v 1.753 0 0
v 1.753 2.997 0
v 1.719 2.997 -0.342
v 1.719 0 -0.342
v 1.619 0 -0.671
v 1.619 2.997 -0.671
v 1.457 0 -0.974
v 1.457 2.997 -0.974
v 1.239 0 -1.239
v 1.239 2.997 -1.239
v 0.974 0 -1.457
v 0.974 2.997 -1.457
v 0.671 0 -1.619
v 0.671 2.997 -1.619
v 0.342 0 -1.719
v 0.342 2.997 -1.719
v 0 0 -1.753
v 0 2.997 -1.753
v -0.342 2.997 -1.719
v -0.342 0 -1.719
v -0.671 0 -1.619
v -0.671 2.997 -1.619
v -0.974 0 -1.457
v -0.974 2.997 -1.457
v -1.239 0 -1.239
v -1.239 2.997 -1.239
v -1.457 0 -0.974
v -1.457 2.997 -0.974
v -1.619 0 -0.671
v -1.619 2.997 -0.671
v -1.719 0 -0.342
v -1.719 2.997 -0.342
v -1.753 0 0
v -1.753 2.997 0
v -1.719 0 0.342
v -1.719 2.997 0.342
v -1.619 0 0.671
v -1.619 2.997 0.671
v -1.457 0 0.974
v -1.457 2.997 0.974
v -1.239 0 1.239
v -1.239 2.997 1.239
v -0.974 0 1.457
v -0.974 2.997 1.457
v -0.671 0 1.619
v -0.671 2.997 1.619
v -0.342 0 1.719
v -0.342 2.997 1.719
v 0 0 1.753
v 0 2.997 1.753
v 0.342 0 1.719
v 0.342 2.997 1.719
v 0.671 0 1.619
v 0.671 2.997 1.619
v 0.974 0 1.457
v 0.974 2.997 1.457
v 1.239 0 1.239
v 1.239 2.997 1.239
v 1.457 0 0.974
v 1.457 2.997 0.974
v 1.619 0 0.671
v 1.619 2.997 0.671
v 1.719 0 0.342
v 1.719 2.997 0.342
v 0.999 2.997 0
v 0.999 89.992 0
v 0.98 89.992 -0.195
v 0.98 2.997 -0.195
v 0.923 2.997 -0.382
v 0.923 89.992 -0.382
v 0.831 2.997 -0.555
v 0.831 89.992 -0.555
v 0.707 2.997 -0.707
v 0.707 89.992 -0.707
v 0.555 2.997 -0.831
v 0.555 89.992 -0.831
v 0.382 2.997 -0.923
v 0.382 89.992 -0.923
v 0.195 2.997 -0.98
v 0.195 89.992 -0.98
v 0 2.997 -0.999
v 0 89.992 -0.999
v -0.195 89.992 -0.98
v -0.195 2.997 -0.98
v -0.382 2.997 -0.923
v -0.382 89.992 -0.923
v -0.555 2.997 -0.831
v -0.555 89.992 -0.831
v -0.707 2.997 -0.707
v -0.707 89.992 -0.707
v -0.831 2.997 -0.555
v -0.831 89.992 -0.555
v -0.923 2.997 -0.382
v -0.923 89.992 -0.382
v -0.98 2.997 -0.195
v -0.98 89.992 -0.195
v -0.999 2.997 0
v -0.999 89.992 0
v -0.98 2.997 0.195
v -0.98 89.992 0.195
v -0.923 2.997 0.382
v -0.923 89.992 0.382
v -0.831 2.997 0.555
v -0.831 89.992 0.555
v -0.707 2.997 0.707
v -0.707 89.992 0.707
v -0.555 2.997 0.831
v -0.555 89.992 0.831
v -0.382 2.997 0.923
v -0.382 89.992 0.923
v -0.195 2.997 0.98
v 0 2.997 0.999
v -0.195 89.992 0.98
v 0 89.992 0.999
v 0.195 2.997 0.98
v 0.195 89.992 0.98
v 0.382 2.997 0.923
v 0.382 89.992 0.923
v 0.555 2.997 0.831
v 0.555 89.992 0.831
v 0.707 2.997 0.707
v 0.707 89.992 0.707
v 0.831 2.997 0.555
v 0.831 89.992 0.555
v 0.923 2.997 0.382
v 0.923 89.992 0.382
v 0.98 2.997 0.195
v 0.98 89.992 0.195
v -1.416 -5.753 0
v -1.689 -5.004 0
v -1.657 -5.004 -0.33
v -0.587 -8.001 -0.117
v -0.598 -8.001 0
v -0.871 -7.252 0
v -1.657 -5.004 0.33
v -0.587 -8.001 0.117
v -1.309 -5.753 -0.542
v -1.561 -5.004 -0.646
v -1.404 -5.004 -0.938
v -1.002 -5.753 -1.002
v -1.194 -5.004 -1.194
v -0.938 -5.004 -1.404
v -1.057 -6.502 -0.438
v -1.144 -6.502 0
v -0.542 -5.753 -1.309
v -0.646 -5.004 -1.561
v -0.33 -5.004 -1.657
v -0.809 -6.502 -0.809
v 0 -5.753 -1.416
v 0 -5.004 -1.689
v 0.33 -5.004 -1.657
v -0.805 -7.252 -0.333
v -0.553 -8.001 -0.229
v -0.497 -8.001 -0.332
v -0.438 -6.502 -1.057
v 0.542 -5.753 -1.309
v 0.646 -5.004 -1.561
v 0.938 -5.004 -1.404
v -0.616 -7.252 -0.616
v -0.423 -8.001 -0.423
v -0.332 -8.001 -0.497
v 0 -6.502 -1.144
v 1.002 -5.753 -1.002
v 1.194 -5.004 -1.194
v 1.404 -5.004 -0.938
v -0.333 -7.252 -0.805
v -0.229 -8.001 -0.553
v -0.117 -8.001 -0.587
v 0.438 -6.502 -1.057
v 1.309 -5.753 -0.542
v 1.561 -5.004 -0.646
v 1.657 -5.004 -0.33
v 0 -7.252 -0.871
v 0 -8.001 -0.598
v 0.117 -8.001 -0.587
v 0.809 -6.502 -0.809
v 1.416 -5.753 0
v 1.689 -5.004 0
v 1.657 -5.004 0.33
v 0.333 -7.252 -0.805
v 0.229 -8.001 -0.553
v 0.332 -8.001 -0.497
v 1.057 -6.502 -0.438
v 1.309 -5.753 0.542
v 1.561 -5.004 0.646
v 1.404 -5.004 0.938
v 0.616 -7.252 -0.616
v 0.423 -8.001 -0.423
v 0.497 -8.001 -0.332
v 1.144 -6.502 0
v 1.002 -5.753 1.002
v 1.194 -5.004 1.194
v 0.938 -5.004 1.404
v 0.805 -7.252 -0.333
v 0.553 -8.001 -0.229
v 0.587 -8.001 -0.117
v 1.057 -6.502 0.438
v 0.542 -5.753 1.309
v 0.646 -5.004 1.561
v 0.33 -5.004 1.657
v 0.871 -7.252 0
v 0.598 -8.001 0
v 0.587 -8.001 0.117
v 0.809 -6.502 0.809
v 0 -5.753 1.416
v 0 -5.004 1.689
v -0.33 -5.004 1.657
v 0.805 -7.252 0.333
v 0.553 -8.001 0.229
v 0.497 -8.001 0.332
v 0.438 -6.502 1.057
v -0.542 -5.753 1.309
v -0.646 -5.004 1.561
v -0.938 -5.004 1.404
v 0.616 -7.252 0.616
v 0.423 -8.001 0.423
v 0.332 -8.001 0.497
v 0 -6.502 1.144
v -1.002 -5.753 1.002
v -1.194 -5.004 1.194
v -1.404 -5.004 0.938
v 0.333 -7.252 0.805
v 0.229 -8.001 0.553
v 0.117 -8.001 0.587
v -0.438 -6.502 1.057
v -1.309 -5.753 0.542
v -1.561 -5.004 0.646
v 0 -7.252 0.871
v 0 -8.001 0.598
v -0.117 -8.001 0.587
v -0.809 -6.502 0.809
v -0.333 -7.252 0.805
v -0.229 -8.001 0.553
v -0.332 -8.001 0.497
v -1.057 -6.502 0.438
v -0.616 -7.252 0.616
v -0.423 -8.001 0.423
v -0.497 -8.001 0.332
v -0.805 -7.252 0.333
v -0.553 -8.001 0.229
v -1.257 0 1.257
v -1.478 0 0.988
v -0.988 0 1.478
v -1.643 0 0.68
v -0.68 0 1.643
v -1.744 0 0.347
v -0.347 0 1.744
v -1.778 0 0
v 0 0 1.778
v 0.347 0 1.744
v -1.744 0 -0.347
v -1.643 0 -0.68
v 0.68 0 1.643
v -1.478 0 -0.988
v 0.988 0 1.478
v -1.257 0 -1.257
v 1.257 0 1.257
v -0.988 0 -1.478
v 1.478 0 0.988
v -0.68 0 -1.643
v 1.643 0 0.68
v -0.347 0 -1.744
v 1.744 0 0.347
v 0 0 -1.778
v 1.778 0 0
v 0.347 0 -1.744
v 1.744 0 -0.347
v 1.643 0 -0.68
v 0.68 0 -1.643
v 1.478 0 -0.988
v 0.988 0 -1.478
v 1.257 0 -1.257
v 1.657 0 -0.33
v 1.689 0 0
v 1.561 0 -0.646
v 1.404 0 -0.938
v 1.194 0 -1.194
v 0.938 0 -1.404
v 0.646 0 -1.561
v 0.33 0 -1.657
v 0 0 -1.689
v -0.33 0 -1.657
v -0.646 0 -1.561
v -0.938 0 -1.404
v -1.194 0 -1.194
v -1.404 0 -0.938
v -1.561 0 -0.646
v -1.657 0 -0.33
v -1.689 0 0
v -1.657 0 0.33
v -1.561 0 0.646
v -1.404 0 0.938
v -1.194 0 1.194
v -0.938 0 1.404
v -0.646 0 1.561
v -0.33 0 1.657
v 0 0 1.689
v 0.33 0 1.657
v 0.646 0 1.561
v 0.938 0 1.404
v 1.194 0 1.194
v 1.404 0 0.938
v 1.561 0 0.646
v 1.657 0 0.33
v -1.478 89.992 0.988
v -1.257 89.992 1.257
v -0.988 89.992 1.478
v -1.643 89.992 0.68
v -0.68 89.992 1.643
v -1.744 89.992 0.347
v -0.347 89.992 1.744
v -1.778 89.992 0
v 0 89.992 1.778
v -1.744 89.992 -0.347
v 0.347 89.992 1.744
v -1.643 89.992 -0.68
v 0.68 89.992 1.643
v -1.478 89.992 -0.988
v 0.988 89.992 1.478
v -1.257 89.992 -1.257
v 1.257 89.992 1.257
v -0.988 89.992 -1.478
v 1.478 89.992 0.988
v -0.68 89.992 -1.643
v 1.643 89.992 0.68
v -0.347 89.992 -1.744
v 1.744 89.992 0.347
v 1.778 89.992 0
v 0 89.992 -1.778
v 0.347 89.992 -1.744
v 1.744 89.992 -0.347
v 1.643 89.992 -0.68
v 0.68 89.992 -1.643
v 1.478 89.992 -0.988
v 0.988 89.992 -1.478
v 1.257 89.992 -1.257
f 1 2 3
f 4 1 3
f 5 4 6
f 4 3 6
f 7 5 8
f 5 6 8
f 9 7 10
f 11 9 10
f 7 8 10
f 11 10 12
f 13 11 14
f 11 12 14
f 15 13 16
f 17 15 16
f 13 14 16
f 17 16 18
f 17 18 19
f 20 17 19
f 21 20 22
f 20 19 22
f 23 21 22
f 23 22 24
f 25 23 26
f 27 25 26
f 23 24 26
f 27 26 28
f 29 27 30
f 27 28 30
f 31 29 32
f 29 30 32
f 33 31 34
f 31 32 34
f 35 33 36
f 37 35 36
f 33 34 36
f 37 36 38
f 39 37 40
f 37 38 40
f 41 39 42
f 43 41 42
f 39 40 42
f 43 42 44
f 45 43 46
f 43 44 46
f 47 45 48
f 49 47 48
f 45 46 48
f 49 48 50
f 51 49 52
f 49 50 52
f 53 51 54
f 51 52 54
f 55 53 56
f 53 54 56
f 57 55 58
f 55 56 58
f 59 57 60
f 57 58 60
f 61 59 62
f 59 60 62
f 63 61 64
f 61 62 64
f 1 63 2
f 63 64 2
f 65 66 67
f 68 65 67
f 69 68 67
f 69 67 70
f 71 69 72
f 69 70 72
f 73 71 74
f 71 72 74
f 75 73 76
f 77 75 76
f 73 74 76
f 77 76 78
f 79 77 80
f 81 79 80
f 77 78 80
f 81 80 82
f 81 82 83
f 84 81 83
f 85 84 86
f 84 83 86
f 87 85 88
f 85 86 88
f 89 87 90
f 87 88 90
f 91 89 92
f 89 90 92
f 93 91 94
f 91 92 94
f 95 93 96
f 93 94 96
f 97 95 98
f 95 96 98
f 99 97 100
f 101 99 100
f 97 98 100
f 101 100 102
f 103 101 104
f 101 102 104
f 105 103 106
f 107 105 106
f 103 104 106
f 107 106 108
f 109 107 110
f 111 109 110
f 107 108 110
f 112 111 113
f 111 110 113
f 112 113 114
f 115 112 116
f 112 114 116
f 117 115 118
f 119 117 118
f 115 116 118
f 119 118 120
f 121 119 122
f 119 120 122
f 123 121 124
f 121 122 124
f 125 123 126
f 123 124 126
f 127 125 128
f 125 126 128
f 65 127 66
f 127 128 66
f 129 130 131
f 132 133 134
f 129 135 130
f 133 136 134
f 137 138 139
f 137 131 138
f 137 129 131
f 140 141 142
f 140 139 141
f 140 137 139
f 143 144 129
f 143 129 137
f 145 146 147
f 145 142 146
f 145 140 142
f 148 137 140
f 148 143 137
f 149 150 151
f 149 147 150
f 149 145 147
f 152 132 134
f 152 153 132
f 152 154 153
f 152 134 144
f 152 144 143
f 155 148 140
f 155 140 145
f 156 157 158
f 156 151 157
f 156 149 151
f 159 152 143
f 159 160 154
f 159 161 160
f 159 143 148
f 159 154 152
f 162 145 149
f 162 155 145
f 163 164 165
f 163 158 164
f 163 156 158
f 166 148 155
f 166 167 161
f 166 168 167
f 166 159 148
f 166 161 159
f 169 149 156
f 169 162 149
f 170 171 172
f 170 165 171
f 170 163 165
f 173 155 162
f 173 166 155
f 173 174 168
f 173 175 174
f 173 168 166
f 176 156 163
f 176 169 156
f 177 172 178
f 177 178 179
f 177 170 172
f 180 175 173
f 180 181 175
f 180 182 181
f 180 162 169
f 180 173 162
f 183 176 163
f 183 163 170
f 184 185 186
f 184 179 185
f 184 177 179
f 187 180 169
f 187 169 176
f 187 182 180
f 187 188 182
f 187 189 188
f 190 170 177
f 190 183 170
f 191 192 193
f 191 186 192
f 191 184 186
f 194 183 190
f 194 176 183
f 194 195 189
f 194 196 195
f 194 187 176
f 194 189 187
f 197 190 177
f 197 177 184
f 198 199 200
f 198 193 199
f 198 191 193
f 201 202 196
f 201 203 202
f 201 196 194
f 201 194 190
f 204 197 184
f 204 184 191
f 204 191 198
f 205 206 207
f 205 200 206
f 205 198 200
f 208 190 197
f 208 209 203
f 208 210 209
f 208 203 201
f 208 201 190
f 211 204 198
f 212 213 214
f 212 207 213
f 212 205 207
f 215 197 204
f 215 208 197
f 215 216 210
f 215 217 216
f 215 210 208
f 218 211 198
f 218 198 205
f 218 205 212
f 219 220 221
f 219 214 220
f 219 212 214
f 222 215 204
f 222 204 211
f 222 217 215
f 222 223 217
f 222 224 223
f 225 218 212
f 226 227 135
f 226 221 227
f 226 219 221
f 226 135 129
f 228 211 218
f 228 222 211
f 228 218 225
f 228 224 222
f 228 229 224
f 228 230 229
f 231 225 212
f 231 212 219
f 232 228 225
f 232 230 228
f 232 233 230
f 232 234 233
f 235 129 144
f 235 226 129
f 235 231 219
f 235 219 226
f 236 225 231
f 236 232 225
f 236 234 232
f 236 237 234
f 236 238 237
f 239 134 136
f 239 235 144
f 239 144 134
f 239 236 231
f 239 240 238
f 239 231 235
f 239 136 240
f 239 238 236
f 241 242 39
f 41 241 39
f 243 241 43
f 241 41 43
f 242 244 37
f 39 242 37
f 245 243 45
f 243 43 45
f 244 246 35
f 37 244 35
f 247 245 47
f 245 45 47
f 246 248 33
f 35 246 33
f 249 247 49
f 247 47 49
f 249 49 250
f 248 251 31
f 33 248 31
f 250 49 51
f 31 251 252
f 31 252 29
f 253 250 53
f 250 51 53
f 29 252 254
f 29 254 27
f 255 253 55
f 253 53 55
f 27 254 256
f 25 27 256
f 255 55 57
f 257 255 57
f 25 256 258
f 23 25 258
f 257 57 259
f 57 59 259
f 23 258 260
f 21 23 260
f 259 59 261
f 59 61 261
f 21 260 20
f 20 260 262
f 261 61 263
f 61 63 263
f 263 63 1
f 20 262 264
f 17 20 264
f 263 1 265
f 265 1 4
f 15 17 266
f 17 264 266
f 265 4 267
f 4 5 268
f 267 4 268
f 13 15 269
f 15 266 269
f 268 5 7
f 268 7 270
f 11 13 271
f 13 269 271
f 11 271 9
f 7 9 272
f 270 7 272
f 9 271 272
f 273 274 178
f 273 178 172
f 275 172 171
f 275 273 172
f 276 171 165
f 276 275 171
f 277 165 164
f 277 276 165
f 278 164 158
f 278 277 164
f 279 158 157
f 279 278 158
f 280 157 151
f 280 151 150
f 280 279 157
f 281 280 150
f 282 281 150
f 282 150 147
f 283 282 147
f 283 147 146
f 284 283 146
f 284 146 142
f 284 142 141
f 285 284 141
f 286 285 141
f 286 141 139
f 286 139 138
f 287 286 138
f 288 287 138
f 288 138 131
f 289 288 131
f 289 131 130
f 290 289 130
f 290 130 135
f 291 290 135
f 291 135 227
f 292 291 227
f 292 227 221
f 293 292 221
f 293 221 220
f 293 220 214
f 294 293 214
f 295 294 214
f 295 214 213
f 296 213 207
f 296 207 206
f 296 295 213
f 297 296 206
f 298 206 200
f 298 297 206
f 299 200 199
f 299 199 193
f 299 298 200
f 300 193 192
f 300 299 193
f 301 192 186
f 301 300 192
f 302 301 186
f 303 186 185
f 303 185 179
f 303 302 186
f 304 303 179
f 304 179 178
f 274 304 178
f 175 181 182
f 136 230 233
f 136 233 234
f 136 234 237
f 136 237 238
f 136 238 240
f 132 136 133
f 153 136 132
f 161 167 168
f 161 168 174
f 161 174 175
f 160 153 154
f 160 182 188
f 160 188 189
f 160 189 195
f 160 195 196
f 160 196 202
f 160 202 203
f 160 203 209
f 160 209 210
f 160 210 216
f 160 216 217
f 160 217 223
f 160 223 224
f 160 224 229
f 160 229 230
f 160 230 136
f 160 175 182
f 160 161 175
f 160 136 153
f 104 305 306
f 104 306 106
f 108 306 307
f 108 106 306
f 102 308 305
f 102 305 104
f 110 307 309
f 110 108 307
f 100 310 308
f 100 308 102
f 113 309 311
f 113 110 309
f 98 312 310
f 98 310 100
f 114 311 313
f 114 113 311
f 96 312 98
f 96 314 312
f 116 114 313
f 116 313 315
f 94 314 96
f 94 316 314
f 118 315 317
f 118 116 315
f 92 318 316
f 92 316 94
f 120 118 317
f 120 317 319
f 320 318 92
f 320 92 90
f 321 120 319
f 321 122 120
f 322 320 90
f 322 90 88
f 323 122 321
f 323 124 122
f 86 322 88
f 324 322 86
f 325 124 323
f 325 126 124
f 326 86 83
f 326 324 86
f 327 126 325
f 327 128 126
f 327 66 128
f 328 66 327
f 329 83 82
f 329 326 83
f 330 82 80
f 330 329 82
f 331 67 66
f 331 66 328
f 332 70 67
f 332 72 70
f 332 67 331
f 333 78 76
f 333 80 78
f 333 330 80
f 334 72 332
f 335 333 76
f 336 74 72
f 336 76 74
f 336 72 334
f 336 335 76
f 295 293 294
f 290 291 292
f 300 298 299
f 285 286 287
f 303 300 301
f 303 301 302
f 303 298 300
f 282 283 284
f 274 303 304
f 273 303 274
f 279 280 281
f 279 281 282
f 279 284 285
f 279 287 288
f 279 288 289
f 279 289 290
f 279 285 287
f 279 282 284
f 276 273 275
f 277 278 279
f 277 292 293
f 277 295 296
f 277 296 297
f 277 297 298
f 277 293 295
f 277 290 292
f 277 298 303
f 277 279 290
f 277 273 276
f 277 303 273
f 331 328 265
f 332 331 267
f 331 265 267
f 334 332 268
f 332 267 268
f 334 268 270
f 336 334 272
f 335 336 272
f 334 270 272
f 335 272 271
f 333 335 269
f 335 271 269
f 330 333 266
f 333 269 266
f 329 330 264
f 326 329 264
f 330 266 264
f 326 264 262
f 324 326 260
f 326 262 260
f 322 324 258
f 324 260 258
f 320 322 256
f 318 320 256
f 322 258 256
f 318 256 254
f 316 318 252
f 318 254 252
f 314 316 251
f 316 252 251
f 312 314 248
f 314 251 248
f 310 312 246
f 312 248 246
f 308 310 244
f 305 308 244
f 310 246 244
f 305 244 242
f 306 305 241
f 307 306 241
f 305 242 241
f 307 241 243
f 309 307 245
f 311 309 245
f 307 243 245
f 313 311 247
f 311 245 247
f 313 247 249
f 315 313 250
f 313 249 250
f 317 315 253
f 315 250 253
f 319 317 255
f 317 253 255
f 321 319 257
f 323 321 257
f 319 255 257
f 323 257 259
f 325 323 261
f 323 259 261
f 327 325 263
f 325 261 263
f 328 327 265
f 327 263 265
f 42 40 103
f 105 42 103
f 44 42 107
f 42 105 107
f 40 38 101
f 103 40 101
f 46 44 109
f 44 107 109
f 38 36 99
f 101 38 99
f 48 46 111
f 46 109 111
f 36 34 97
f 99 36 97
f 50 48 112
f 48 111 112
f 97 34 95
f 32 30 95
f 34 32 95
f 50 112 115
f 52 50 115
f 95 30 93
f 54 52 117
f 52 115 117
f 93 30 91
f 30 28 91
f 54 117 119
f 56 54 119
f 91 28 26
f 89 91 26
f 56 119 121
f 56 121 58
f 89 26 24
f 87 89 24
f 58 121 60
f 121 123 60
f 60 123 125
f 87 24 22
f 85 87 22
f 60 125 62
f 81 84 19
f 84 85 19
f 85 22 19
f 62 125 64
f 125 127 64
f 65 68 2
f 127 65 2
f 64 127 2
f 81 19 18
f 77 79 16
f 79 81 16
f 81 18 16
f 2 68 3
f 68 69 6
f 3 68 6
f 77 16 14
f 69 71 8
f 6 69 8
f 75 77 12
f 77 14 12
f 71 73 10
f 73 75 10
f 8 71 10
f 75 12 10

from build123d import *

# Parameters (mm, degrees)
SKETCH2_R           = 1.778
BOSS_EXTRUDE1_DEPTH = 89.9922
SKETCH3_R           = 1.6891
BOSS_EXTRUDE2_DEPTH = 8.001
SKETCH4_R           = 0.99949
CUT_EXTRUDE1_DEPTH  = 86.995
SKETCH5_R           = 1.7526
CUT_EXTRUDE2_DEPTH  = 2.9972


with BuildPart() as part:
    # Sketch2 → Boss-Extrude1 (new body)
    with BuildSketch(Plane(origin=(0, 0, 0), x_dir=(1, 0, 0), z_dir=(0, 1, 0))):
        Circle(SKETCH2_R)
    extrude(amount=BOSS_EXTRUDE1_DEPTH)

    # Sketch3 → Boss-Extrude2 (add)
    with BuildSketch(Plane(origin=(0, 2.9972, 0), x_dir=(1, 0, 0), z_dir=(0, 1, 0))):
        Circle(SKETCH3_R)
    extrude(amount=-BOSS_EXTRUDE2_DEPTH)

    # Sketch4 → Cut-Extrude1 (cut)
    with BuildSketch(Plane(origin=(0, 89.9922, 0), x_dir=(1, 0, 0), z_dir=(0, 1, 0))):
        Circle(SKETCH4_R)
    extrude(amount=-CUT_EXTRUDE1_DEPTH, mode=Mode.SUBTRACT)

    # Sketch5 → Cut-Extrude2 (cut)
    with BuildSketch(Plane(origin=(0, 2.9972, 0), x_dir=(1, 0, 0), z_dir=(0, 1, 0))):
        Circle(SKETCH5_R)
    extrude(amount=-CUT_EXTRUDE2_DEPTH, mode=Mode.SUBTRACT)

    # Sketch6 → Revolve2 (revolve)
    with BuildSketch(Plane.XY):
        Polygon((-1.6891, -5.0038), (-0.598208414, -8.001), (0, -8.001), (0, -5.0038), align=None)
    revolve(axis=Axis((0, 0, 0), (0, -1, 0)))


solid = part.part
